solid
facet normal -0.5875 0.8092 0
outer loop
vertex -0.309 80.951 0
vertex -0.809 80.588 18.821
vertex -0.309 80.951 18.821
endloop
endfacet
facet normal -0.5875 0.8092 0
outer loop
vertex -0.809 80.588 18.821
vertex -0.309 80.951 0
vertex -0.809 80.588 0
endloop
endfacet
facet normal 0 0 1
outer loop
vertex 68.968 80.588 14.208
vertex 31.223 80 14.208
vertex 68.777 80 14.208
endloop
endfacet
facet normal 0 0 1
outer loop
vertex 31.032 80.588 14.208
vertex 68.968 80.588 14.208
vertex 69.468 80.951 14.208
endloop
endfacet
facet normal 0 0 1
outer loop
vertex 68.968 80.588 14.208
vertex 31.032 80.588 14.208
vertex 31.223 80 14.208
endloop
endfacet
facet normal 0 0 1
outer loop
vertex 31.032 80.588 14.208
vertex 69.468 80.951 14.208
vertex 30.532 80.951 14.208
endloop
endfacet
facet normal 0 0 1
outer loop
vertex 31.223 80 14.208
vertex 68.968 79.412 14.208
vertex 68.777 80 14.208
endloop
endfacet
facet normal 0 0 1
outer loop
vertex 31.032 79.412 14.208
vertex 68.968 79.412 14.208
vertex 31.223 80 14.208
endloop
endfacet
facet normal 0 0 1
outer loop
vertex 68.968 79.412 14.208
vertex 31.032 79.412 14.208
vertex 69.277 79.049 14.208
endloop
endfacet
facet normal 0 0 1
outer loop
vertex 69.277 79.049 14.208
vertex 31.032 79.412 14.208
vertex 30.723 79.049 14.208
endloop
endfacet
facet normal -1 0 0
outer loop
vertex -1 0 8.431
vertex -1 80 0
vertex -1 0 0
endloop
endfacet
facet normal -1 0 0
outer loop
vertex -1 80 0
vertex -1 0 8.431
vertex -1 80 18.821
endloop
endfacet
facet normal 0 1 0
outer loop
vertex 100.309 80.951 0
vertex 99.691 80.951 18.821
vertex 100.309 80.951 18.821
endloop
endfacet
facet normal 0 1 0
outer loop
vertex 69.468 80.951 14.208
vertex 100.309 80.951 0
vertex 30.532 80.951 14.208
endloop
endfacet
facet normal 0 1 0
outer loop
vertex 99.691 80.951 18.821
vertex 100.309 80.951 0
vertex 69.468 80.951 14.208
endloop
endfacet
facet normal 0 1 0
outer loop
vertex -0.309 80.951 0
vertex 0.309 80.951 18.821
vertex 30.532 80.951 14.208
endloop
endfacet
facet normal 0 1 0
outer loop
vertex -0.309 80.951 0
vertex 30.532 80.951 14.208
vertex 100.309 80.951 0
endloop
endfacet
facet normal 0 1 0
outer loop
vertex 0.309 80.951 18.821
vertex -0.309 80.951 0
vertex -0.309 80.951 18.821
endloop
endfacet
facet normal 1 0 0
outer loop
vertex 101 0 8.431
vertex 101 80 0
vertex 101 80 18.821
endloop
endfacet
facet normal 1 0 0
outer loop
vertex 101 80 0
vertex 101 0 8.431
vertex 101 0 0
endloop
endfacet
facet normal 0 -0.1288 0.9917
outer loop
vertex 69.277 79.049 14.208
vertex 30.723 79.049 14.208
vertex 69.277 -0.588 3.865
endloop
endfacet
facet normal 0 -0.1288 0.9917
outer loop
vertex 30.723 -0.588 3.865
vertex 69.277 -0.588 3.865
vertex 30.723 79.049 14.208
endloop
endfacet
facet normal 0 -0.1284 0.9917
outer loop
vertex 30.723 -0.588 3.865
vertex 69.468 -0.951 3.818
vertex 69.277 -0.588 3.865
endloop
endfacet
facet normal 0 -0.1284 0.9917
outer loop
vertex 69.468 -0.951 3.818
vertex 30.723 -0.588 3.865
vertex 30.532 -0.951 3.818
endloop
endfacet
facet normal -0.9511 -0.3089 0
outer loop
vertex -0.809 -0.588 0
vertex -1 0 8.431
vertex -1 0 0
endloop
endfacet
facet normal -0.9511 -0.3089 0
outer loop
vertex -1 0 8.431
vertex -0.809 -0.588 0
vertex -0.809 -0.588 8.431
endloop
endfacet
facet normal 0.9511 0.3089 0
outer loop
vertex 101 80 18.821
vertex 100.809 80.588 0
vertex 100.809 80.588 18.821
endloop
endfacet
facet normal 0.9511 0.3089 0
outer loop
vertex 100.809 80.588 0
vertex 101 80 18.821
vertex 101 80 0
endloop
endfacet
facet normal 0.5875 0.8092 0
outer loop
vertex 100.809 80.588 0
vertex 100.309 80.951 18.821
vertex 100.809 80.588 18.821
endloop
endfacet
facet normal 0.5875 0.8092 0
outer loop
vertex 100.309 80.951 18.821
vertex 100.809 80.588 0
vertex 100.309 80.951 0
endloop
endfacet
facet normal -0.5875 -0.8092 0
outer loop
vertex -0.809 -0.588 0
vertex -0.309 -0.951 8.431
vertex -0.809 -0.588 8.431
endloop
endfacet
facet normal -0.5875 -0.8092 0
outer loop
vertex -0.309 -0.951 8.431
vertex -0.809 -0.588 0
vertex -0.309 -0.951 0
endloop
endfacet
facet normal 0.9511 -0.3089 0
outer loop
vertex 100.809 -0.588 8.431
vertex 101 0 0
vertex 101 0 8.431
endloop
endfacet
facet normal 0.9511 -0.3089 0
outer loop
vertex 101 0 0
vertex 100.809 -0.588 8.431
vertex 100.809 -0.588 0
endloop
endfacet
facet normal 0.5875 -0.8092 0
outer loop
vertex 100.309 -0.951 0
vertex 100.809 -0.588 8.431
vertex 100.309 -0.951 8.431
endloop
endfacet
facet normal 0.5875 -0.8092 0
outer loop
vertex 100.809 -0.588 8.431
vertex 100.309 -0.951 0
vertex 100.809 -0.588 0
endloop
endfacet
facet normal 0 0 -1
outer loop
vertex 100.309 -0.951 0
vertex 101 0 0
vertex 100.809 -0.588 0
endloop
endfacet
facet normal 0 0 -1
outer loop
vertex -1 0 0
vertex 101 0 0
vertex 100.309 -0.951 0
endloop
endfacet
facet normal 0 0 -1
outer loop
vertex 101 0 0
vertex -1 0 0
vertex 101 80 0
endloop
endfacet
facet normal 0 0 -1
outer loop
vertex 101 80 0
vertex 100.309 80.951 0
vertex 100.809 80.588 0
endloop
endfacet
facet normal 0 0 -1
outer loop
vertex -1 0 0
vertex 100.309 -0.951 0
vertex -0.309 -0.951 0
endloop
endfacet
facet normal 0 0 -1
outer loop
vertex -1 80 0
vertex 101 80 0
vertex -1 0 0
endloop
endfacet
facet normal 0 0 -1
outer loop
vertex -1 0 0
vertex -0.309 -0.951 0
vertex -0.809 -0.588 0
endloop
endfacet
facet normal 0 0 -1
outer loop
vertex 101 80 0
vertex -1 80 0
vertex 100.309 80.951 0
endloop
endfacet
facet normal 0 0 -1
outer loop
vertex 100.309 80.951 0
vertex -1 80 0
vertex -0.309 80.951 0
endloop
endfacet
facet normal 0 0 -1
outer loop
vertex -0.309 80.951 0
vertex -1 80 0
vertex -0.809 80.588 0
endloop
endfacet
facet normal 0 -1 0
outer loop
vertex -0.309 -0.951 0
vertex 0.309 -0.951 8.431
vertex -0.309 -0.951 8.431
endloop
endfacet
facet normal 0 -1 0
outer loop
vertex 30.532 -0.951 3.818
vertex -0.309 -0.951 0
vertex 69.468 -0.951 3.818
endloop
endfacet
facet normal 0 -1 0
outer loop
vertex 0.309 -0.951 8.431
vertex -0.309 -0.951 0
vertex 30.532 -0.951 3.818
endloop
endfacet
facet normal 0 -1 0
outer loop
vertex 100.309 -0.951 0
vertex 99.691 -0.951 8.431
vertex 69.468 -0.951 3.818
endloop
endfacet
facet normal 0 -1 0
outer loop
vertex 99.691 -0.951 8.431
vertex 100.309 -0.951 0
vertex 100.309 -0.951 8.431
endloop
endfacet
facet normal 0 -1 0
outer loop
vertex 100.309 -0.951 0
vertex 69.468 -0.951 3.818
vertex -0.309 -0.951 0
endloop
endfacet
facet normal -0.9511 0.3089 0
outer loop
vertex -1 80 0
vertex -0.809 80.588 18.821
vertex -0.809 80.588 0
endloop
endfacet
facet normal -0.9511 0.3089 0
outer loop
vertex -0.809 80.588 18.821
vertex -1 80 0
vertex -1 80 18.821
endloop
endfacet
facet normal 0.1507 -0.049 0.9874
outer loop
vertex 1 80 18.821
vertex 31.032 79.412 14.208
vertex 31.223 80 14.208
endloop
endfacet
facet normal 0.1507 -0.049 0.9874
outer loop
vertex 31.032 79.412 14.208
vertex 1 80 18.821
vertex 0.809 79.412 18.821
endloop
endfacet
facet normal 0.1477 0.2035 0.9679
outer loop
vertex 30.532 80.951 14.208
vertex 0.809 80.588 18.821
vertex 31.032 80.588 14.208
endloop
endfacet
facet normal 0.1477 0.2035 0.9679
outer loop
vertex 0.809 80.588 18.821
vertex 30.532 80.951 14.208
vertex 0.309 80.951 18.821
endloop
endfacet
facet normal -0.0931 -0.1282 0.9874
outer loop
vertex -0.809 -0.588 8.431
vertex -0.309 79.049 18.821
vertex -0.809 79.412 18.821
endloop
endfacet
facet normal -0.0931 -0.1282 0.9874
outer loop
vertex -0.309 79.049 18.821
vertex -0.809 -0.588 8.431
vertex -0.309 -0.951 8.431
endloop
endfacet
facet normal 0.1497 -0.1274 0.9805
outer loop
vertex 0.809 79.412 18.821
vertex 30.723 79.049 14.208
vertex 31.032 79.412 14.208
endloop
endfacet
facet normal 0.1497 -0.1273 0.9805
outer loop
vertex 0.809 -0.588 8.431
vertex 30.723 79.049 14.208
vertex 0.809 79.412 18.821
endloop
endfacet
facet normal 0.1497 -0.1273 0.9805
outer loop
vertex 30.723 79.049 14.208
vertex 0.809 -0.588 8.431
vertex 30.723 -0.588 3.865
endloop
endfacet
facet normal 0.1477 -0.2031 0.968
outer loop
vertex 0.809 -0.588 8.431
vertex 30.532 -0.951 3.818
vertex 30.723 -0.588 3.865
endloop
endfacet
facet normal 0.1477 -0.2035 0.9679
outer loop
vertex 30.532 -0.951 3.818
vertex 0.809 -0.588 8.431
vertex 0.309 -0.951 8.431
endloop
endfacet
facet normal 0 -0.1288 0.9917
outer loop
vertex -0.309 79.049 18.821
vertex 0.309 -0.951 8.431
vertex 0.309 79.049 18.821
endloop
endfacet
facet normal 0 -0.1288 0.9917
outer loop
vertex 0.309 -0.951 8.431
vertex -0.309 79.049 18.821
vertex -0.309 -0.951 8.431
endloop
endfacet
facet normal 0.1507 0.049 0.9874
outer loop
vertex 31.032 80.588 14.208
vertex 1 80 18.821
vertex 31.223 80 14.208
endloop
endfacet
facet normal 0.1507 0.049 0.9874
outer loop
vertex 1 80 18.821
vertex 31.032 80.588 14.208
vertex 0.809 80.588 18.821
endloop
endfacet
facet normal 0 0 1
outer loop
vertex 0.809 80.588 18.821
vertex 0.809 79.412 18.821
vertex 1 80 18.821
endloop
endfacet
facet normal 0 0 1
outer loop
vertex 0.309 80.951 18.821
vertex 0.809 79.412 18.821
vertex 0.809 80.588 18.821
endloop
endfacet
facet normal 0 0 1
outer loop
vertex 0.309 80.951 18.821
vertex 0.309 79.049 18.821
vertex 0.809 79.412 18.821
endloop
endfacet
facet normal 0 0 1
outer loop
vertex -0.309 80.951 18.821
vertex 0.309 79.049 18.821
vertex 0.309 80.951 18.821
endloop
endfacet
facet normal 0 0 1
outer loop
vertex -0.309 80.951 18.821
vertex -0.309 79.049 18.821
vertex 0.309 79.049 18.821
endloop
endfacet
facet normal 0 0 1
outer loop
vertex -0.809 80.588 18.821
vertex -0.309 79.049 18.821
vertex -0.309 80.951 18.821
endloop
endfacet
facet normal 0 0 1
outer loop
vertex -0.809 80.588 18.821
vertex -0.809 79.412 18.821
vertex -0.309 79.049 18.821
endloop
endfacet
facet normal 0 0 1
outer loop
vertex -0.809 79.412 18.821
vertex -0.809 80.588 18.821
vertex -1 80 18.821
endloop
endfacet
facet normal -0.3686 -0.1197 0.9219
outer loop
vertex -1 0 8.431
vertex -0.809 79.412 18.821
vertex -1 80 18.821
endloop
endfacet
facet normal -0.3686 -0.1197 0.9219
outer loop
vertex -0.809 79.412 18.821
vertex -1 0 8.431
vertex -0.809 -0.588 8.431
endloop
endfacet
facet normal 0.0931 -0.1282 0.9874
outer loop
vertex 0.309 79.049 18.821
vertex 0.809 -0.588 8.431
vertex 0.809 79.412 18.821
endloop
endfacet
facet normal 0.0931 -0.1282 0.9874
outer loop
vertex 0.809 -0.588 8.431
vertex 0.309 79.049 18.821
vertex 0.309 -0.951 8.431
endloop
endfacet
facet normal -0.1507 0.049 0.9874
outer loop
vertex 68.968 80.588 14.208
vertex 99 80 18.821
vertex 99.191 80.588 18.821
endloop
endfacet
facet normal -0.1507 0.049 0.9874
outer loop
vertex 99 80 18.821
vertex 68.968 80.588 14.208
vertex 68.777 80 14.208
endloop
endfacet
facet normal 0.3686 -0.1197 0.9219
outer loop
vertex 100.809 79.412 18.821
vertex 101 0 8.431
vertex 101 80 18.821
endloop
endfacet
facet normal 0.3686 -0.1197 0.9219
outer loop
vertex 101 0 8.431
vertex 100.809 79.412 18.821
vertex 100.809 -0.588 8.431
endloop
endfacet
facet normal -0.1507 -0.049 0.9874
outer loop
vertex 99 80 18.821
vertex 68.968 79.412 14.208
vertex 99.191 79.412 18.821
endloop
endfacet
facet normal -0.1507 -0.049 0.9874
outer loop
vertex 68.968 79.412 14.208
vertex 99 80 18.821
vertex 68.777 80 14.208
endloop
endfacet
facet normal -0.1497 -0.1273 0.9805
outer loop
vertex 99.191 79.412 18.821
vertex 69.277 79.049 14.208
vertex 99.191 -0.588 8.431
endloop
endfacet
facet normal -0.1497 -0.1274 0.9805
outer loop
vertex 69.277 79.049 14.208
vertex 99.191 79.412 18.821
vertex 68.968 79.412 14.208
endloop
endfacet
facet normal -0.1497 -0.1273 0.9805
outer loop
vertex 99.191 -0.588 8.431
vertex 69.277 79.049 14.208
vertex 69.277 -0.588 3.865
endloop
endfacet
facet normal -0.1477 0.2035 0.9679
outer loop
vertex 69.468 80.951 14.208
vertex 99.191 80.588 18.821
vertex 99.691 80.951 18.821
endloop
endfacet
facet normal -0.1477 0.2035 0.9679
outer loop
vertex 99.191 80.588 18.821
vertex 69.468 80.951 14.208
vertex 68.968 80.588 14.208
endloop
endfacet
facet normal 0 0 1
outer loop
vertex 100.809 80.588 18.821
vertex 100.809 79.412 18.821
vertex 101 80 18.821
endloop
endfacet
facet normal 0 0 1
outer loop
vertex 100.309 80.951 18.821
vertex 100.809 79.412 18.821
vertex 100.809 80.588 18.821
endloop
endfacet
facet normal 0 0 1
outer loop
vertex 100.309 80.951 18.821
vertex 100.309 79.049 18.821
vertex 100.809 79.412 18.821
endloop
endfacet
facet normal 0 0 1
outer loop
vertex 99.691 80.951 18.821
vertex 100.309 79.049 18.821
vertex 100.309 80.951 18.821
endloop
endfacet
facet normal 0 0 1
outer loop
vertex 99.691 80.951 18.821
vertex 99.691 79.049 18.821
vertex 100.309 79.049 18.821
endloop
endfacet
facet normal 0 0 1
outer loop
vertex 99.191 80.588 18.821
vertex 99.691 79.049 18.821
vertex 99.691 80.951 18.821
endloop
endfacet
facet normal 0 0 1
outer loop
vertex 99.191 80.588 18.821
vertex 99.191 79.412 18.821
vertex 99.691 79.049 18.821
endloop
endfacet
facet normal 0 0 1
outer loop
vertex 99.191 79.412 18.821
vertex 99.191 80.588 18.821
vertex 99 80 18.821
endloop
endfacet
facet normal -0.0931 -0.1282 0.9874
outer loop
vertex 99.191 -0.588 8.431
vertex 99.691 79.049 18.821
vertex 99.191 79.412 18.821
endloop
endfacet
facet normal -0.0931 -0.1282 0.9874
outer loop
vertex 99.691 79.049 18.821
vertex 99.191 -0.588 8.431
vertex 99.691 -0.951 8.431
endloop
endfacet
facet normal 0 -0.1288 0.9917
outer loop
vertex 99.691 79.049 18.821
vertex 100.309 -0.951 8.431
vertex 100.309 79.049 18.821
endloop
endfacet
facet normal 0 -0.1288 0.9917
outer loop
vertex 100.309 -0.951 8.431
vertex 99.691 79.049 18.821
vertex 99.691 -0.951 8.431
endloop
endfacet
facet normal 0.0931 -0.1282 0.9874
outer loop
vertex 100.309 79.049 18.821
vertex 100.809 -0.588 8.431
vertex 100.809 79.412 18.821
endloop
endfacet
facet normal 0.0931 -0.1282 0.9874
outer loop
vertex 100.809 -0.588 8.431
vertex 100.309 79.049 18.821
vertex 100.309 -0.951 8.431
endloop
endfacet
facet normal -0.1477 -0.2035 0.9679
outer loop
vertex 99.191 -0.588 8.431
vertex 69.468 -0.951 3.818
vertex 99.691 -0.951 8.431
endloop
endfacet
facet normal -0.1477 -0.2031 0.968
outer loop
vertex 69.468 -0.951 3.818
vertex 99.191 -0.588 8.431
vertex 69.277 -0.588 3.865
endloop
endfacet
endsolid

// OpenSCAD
$fn=10; // Visual detail (lower this for preview renders)
WIDTH = 100; // [100:400]
DEPTH = 80; // [80:120]
HEIGHT = 20; // [15:30]

/* Render the model */
RoundedWristRest();

/* 
This generates the dynamic molding for the palm of your hands
*/
module Mold() {
  angle = 90+(HEIGHT*0.5)+(-0.020*DEPTH)+(-0.010*WIDTH);
  translate([WIDTH/2,DEPTH/2,HEIGHT+(0.01*DEPTH)])
    rotate([angle])
      scale([((DEPTH/HEIGHT)*0.6)*(WIDTH*0.01*2),1,2])
        cylinder(h = DEPTH*1.5, 
                 r1 = HEIGHT/1.5,
                 r2 = HEIGHT/1.5,
                 center=true);
}

/* 
Build the dynamic base platform
*/
module Platform() {
  linear_extrude(HEIGHT/2) {
    square([WIDTH, DEPTH]);
  }
  
  translate([0,0,0+HEIGHT/2]) {
    polyhedron(
      points=[
        [0,0,0], [WIDTH,0,0],
        [WIDTH,DEPTH,0], [0,DEPTH,0],
        [0,DEPTH,HEIGHT/2], [WIDTH,DEPTH,HEIGHT/2]],
      faces=[[0,1,2,3], [5,4,3,2], [0,4,5,1], [0,3,4], [5,2,1]]
    );
  }
}

/* 
Build the wrist rest
*/
module WristRest() {
  difference() {
    Platform();
    Mold();
  }
}

/* 
Build a rounded version of the wrist rest (just looks nicer)
*/
module RoundedWristRest() {
  minkowski() {
    WristRest();
    cylinder(r=1, h=1);
  }
}
